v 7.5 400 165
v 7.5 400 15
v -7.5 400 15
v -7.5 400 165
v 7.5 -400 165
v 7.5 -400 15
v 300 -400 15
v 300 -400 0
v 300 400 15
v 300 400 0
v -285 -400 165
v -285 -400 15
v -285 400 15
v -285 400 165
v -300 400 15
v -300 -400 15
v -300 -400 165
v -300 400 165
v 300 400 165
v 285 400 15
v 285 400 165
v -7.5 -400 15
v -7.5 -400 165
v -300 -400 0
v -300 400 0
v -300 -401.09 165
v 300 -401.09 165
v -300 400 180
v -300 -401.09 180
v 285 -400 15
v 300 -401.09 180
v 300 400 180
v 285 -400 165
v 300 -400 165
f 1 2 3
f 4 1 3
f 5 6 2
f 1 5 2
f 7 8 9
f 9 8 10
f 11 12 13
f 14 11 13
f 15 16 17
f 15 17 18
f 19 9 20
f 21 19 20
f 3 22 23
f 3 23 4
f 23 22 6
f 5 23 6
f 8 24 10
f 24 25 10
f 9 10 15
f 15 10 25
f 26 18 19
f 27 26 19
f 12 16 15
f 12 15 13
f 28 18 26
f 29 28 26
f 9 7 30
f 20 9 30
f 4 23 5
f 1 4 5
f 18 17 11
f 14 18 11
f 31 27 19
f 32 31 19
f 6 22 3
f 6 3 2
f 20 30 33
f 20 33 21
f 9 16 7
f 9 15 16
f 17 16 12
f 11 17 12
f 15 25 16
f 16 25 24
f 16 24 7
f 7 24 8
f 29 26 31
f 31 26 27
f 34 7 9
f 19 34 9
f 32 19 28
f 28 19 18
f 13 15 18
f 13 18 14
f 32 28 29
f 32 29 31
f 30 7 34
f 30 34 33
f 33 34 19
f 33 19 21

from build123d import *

# Parameters (mm, degrees)
F0_W     = 300
F0_H     = 400
F1_DEPTH = 15
F2_W     = 15
F2_H     = 800
F3_DEPTH = 150
F5_W     = 7.5
F5_H     = 800
F6_DEPTH = 150
F7_W     = 15
F7_H     = 800
F8_DEPTH = 15


with BuildPart() as f1:
    # F0 (on Top) → F1 (new body)
    with BuildSketch(Plane.XY):
        with Locations((-150, -200)):
            Rectangle(F0_W, F0_H)
        with Locations((150, -200)):
            Rectangle(F0_W, F0_H)
        with Locations((150, 200)):
            Rectangle(F0_W, F0_H)
        with Locations((-150, 200)):
            Rectangle(F0_W, F0_H)
    extrude(amount=F1_DEPTH)


with BuildPart() as f3:
    # F2 (on face) → F3 (new body)
    with BuildSketch(Plane.XY.offset(15)):
        with Locations((-292.5, 0)):
            Rectangle(F2_W, F2_H)
    extrude(amount=F3_DEPTH)


with BuildPart() as f4_1:
    # F4: instance of F3
    add(f3.part.mirror(Plane.YZ))


with BuildPart() as f6:
    # F5 (on face) → F6 (new body)
    with BuildSketch(Plane.XY.offset(15)):
        with Locations((3.75, 0)):
            Rectangle(F5_W, F5_H)
        with Locations((-3.75, 0)):
            Rectangle(F5_W, F5_H)
    extrude(amount=F6_DEPTH)


with BuildPart() as f8:
    # F7 (on face) → F8 (new body)
    with BuildSketch(Plane.XY.offset(165)):
        with Locations((-292.5, 0)):
            Rectangle(F7_W, F7_H)
        Polygon((300, 400), (-285, 400), (-285, -400), (-300, -400), (-300, -401.0900557041), (300, -401.0900557041), align=None)
    extrude(amount=F8_DEPTH)


solid = Compound([f1.part, f3.part, f4_1.part, f6.part, f8.part])
